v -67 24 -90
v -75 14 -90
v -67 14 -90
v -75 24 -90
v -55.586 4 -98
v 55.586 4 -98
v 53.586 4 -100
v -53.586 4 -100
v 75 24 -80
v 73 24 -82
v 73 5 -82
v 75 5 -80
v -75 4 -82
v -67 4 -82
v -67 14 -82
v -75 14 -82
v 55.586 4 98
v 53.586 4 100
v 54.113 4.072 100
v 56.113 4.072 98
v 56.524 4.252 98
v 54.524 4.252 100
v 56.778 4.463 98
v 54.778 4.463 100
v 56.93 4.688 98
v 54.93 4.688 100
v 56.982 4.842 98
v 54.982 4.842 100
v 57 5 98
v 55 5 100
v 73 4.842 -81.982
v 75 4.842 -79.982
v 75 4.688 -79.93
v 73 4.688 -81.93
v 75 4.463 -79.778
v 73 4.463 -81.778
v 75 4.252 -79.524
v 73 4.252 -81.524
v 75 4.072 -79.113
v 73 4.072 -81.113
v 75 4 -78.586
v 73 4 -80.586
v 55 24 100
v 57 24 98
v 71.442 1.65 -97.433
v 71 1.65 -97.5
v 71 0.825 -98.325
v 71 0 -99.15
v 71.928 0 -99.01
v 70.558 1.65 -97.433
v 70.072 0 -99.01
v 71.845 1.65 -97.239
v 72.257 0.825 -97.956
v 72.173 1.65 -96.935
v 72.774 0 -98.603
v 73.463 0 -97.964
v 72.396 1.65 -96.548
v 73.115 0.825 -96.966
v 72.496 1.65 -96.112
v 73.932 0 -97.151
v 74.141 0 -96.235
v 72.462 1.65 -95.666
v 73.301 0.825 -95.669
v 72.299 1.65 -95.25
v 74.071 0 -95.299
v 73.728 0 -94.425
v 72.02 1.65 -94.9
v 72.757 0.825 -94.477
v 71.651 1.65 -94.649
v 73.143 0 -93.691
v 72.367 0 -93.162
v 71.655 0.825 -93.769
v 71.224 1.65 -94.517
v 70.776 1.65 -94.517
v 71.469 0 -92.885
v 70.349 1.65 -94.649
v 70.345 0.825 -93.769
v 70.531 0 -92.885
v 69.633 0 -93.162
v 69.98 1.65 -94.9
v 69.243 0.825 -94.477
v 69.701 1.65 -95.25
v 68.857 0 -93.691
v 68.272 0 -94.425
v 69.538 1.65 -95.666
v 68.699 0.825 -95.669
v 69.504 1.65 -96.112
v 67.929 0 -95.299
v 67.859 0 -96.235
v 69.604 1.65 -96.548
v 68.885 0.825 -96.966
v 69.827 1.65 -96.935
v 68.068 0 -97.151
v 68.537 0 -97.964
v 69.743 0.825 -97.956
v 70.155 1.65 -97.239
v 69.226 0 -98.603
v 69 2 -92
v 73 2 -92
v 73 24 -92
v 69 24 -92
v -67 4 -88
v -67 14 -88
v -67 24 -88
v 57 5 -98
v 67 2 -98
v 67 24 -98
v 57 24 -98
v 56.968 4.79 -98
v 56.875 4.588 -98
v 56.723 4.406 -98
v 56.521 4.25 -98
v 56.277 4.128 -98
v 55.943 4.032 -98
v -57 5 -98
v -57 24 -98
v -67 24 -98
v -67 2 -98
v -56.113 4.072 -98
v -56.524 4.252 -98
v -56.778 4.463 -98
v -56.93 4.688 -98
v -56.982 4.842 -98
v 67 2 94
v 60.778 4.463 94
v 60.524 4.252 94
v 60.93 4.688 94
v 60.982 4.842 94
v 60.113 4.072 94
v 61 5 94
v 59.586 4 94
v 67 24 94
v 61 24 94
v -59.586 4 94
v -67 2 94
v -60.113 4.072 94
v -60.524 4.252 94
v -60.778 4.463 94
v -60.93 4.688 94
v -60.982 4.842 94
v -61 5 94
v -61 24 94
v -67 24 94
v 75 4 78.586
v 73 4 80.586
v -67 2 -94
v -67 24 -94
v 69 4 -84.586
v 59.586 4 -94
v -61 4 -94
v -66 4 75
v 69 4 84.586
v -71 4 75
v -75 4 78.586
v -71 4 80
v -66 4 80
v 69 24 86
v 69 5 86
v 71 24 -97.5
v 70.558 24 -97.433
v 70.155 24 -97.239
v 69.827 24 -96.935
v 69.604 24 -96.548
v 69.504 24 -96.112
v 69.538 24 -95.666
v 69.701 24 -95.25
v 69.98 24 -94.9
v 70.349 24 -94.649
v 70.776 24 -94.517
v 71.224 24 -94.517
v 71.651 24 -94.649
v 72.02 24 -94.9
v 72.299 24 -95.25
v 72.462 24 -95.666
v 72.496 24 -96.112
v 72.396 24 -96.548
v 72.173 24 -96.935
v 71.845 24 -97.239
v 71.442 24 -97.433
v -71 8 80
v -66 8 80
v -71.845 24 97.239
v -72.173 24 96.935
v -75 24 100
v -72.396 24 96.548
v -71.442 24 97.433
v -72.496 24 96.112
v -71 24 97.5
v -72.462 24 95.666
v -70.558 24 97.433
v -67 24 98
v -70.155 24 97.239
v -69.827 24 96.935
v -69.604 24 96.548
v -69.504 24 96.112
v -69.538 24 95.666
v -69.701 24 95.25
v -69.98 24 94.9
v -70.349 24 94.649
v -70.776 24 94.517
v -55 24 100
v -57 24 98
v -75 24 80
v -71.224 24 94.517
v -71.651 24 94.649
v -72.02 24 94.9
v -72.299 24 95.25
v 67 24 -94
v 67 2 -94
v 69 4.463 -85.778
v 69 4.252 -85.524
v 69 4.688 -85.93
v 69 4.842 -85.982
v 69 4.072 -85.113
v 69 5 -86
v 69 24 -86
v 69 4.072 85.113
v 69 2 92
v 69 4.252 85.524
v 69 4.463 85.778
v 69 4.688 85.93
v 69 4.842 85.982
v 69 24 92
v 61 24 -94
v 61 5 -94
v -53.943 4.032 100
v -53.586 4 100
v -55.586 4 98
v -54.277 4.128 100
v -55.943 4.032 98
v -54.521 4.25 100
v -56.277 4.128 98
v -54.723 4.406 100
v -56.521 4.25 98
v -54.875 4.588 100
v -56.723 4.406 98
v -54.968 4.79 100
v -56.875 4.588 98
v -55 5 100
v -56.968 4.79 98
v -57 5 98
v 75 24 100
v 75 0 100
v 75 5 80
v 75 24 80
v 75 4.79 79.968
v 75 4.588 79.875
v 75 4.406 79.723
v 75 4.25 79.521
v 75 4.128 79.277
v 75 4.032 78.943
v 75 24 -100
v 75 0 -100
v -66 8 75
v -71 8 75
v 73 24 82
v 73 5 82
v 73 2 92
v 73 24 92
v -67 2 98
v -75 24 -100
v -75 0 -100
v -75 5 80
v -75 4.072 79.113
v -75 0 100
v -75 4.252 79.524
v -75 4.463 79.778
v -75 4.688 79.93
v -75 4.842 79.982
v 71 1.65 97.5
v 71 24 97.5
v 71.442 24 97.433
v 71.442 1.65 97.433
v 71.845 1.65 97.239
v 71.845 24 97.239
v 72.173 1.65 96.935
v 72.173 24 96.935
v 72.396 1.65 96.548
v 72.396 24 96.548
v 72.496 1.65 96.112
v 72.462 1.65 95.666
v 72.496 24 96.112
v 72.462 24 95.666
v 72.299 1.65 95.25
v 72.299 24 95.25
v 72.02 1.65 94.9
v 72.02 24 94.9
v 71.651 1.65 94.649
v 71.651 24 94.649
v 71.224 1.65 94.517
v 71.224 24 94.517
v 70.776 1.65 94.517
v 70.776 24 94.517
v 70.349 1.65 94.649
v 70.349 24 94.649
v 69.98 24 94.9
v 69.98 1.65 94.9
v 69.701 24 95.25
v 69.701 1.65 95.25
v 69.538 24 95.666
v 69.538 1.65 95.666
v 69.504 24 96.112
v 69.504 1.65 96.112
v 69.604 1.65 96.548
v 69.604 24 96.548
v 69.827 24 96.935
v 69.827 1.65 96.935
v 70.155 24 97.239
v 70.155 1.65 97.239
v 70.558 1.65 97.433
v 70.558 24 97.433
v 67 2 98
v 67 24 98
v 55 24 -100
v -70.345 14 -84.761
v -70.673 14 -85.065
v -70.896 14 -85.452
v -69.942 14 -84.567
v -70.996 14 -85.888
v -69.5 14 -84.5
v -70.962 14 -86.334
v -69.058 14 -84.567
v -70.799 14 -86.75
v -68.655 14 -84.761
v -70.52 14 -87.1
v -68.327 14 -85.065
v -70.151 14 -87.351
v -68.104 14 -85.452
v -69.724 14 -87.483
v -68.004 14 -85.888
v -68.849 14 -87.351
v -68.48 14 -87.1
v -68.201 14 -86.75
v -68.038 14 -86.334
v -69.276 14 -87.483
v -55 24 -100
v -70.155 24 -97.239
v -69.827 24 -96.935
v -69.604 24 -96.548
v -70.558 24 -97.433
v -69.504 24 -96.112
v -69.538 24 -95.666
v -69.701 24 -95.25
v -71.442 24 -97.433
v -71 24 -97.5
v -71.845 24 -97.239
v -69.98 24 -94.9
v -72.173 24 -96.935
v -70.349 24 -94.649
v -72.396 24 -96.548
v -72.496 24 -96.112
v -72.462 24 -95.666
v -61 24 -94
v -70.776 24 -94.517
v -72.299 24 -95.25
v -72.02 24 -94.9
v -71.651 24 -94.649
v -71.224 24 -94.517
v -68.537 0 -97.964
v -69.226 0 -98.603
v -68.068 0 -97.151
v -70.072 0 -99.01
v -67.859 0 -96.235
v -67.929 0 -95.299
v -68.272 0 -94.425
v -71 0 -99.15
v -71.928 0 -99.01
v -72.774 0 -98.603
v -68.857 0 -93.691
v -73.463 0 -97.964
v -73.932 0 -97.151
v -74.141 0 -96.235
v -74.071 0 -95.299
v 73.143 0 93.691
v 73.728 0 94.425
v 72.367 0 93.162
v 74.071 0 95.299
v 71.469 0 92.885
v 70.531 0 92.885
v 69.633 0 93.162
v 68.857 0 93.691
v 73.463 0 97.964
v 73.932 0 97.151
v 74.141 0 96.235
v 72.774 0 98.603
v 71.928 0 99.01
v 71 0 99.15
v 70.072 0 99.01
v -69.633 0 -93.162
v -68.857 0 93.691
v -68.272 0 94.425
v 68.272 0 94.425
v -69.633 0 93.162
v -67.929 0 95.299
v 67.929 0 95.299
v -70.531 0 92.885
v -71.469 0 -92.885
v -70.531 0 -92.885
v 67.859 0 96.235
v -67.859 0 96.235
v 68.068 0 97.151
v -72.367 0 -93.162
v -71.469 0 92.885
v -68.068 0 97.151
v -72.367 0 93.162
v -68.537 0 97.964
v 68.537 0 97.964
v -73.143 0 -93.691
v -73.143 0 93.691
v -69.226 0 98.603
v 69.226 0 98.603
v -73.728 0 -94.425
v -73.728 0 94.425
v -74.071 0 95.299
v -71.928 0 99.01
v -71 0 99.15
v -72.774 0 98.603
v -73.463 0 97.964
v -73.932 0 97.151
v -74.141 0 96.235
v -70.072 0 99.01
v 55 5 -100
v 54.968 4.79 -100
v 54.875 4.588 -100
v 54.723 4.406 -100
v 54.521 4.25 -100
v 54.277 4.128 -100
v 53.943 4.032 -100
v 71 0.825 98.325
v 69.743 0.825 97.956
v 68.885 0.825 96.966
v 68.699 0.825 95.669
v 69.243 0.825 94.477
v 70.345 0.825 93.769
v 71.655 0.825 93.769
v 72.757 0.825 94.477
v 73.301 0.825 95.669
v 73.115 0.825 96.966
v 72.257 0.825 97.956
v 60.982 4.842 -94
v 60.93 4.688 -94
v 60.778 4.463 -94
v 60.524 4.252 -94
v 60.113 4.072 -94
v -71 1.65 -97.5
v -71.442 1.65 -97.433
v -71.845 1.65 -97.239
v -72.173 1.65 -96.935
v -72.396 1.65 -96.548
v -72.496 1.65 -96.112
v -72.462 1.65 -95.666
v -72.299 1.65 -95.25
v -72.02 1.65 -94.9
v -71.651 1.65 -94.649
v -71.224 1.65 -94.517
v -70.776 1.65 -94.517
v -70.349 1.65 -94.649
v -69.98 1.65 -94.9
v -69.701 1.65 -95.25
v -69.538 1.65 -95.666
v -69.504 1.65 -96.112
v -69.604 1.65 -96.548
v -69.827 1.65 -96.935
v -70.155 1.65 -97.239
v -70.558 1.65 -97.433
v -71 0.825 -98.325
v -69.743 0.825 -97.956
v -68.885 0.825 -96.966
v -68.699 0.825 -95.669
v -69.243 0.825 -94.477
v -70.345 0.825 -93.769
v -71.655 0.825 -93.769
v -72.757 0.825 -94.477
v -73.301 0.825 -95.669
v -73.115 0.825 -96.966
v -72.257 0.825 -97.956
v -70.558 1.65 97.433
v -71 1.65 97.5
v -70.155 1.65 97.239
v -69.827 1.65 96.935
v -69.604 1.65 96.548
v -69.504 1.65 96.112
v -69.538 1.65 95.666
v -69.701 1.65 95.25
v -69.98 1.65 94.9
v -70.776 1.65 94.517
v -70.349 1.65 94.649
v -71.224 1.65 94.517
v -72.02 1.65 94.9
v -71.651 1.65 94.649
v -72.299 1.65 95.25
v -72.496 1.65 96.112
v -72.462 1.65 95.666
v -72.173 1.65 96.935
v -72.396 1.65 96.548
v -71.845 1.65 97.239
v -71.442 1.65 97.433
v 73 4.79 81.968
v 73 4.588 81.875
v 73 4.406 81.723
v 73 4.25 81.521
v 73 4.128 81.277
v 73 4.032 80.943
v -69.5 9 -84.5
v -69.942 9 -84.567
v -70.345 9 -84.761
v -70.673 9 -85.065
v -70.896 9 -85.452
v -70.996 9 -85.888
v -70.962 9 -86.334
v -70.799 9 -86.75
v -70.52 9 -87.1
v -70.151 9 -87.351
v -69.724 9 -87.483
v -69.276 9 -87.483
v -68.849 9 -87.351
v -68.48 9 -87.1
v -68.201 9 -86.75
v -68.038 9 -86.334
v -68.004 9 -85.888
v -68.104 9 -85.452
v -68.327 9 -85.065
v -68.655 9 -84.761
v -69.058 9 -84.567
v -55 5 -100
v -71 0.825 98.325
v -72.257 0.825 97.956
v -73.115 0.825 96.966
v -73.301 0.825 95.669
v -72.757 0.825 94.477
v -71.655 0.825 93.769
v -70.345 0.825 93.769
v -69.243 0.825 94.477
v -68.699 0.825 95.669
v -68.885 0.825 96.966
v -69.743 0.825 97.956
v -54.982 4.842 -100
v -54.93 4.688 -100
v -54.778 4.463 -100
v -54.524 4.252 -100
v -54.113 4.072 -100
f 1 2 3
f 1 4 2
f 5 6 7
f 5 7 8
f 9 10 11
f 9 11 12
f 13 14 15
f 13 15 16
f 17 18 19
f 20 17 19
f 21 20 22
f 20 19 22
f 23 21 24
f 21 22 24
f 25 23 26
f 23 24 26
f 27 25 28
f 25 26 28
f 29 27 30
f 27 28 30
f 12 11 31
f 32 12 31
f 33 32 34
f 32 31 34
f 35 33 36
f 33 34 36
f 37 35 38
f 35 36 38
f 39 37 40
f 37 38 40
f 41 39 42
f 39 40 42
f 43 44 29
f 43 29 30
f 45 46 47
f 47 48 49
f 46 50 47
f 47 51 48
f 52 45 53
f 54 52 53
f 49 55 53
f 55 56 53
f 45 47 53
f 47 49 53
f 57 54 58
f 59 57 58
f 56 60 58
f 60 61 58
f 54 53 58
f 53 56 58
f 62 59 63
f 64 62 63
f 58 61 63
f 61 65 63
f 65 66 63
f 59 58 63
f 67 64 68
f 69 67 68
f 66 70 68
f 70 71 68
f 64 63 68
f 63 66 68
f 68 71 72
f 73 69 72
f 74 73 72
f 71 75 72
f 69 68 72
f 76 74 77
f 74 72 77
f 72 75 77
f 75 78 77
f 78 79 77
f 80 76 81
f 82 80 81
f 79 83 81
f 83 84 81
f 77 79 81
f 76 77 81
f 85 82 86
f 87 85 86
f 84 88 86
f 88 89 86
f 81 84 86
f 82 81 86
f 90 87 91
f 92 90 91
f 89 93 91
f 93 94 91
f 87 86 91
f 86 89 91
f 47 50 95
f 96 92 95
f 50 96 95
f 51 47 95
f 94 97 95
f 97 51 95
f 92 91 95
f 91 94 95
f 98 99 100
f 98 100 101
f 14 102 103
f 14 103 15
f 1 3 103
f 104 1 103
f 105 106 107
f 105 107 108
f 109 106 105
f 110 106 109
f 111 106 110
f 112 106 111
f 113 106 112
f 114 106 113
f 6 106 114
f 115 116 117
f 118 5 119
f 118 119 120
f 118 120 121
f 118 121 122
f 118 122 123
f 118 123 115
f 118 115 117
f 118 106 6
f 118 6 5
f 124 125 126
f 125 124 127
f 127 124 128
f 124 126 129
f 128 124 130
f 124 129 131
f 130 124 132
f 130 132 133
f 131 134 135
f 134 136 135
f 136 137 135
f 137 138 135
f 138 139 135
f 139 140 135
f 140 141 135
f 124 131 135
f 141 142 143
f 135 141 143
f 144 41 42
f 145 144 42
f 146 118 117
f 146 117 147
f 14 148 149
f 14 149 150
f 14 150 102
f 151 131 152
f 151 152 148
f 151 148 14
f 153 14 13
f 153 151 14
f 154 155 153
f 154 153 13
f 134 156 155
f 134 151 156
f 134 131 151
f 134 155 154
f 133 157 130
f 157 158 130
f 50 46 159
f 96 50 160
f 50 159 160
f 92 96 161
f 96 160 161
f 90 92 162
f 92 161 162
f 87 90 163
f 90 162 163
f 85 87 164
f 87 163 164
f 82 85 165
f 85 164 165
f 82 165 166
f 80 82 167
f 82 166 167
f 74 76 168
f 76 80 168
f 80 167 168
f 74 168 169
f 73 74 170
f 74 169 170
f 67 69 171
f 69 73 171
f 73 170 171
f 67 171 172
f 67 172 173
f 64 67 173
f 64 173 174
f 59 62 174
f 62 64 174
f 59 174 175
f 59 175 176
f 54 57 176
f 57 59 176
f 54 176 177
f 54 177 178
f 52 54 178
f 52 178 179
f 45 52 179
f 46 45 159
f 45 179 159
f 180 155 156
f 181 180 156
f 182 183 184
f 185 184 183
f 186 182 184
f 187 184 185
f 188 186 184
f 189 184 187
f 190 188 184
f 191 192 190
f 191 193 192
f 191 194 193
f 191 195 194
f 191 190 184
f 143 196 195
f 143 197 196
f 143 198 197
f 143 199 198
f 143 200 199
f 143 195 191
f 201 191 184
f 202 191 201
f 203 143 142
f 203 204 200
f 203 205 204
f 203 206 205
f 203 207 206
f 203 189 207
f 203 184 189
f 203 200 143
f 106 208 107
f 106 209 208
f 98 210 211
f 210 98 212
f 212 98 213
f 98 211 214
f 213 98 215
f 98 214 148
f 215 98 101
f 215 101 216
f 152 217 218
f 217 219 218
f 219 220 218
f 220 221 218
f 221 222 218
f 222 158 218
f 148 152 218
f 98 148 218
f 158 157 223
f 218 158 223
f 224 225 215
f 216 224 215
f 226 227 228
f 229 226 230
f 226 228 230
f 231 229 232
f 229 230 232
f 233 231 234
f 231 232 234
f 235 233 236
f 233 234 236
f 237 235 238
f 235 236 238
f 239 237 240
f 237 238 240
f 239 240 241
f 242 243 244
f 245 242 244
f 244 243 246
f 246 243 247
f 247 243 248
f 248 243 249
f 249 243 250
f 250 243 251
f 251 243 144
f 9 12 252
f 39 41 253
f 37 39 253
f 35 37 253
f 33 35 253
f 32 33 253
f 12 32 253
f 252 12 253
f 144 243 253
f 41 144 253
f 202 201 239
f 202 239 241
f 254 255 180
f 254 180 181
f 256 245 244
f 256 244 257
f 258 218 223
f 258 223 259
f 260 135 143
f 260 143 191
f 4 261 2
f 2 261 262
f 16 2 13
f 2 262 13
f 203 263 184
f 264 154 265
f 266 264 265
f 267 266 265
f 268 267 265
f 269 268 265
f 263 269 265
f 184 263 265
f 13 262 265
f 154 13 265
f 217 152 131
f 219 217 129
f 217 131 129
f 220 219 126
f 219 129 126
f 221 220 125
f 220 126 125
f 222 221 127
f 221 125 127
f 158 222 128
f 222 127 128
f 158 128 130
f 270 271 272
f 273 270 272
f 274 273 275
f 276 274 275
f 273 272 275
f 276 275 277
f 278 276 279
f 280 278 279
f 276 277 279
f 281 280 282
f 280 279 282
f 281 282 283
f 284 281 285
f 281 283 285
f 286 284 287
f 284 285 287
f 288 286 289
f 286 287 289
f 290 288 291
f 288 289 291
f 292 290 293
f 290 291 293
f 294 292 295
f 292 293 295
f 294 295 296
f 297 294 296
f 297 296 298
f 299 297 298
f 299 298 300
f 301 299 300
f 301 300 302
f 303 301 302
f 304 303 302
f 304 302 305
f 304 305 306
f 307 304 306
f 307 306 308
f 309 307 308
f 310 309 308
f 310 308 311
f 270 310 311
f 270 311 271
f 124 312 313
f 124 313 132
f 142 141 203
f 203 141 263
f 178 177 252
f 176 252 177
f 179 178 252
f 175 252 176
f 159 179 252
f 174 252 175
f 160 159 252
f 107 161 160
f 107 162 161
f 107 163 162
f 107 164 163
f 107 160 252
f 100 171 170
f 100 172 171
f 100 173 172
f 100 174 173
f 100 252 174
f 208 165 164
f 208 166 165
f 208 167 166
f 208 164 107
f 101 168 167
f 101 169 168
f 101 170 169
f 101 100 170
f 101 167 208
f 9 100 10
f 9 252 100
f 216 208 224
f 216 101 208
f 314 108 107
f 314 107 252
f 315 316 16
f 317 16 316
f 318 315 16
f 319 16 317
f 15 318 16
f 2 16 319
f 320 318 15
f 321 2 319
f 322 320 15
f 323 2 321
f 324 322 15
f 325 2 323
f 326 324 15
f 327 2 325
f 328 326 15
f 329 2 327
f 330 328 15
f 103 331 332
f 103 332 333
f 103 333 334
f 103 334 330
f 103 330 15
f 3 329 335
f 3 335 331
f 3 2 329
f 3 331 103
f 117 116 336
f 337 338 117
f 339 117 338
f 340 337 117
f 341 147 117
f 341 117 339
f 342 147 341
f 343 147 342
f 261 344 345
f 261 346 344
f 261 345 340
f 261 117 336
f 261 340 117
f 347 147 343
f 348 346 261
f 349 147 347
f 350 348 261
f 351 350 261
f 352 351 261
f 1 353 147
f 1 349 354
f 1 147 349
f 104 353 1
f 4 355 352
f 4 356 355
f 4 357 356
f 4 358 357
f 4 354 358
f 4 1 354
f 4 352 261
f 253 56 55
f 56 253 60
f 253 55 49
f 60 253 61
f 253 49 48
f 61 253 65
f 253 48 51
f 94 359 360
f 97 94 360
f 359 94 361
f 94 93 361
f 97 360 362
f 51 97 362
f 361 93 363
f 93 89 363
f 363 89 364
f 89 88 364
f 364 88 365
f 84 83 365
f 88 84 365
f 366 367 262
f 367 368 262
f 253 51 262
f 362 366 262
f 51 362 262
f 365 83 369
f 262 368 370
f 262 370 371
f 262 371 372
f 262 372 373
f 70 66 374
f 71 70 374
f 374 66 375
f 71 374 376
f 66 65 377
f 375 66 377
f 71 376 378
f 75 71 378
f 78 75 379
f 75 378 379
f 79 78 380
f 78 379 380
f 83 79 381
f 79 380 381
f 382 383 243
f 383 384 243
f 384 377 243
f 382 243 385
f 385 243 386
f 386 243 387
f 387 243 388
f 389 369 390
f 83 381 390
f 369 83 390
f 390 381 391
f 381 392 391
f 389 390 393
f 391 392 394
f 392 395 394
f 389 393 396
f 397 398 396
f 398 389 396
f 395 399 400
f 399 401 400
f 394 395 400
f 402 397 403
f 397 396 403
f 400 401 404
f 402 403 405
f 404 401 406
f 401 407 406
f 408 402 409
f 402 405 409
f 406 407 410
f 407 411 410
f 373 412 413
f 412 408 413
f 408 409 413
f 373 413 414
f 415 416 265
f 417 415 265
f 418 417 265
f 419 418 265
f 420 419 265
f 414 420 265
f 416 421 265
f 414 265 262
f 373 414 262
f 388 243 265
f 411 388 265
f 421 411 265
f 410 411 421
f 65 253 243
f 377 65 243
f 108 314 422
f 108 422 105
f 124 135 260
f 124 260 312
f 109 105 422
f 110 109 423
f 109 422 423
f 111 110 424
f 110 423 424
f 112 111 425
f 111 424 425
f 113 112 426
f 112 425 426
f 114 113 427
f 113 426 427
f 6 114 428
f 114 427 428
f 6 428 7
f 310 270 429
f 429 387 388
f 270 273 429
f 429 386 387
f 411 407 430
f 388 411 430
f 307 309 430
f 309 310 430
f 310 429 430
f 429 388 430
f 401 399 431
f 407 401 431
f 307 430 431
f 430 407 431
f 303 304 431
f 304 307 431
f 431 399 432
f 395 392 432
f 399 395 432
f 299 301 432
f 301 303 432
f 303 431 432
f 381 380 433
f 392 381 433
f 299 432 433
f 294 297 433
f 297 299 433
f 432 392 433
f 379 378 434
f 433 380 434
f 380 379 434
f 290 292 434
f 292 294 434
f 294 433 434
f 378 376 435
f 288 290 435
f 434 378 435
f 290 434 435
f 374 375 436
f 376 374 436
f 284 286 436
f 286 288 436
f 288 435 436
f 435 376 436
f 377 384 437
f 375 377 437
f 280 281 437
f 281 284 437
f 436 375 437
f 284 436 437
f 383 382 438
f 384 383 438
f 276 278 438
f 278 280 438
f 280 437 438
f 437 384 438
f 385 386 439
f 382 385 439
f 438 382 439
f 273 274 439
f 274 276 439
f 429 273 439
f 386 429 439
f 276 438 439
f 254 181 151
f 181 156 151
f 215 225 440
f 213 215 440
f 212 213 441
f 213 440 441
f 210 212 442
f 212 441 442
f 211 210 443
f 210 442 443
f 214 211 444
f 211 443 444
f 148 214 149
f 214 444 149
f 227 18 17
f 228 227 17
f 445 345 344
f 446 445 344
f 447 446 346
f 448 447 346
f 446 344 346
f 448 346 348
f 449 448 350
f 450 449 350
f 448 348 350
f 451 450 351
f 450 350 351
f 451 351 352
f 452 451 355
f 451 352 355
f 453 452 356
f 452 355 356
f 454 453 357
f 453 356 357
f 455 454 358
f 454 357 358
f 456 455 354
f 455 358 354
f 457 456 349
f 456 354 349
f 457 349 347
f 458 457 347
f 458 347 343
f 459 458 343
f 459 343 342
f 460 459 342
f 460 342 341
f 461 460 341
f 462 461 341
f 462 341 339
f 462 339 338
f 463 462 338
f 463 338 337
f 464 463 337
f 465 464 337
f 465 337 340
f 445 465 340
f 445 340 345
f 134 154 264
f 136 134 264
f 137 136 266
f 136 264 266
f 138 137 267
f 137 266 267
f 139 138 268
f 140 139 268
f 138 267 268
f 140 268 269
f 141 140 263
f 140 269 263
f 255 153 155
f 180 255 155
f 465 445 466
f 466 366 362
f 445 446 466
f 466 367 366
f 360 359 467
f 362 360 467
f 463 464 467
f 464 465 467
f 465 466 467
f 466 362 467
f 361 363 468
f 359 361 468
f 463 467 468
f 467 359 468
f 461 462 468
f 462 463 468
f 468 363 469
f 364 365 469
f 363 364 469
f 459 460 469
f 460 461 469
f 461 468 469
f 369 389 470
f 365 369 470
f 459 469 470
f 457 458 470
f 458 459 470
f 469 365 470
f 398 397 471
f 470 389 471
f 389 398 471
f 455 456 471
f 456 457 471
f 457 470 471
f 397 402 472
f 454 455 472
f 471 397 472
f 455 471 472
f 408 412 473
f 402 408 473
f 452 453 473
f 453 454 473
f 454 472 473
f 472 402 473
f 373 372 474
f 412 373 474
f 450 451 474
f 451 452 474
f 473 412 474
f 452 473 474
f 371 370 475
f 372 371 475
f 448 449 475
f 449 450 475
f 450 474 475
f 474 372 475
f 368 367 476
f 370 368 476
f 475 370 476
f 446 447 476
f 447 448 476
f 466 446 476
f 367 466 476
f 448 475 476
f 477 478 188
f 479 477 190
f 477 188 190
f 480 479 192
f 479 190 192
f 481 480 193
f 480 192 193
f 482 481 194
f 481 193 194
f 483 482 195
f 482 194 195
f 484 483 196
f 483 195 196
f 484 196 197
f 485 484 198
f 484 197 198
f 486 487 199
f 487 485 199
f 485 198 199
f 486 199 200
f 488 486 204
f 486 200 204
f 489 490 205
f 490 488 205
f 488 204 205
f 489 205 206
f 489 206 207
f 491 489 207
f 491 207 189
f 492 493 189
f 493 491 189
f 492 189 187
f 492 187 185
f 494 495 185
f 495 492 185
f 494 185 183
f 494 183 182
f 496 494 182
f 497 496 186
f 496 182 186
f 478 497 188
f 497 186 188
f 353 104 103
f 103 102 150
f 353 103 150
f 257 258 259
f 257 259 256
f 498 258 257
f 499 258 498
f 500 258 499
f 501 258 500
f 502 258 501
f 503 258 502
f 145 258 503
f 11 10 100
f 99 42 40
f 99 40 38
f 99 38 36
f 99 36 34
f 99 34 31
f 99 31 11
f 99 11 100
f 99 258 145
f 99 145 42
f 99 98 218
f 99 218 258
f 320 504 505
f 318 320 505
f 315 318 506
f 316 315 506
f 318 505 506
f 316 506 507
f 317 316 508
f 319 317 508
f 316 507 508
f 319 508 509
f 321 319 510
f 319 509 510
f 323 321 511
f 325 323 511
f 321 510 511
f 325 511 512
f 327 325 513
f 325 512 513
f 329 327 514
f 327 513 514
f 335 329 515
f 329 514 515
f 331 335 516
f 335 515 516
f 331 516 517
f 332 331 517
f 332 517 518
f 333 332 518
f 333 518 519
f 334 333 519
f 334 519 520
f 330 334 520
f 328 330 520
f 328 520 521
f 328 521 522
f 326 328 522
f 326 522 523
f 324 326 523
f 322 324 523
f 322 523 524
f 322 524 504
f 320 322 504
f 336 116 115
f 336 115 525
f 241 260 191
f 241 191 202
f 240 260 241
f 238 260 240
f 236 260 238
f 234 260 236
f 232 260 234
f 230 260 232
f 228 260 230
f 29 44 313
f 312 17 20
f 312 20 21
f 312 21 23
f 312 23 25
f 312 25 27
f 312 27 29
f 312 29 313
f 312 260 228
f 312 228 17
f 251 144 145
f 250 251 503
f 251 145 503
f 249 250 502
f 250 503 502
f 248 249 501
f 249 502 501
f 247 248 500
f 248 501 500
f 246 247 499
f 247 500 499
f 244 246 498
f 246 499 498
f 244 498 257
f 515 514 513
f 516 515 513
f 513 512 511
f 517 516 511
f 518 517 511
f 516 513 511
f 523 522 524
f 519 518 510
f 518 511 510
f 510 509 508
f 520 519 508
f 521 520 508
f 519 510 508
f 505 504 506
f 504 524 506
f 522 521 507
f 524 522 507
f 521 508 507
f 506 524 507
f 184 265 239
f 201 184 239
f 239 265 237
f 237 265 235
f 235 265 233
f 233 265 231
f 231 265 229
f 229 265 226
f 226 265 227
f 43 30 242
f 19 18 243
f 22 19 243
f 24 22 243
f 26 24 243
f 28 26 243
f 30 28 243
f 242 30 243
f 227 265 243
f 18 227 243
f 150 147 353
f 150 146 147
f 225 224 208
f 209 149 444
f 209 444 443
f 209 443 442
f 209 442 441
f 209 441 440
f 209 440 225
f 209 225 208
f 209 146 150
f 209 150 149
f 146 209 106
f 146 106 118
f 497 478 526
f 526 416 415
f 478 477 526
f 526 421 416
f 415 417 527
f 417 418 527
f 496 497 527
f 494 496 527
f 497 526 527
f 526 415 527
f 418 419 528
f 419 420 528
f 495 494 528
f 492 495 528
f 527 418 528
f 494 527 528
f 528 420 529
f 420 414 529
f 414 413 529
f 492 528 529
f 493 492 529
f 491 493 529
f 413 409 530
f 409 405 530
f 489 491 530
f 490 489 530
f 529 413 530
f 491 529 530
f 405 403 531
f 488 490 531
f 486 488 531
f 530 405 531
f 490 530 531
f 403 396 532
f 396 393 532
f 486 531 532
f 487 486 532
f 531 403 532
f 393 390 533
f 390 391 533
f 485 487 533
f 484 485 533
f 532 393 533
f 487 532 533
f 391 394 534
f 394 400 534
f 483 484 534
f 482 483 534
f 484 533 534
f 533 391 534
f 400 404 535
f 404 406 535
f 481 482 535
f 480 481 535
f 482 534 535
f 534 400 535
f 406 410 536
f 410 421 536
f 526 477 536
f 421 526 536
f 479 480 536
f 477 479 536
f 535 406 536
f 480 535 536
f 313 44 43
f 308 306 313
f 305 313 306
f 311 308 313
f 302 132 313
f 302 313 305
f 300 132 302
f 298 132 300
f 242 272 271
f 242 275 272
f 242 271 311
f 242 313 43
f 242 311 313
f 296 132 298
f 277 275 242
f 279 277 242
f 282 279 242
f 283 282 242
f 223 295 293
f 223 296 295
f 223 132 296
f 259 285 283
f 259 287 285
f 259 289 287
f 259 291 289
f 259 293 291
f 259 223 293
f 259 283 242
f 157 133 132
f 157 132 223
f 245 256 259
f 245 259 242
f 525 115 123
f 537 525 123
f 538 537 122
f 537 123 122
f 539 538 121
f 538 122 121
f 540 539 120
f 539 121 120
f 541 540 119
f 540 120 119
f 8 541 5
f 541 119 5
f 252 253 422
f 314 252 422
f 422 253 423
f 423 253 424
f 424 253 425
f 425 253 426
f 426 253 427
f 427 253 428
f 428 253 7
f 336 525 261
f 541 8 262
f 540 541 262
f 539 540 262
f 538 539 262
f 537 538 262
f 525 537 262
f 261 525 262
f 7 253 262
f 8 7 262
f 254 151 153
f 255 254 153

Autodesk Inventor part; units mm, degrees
ref_plane "YZ Plane" through (0, 0, 0) normal (1, 0, 0) x (0, 1, 0)
sketch "Náčrt1" plane through (0, 0, 0) normal (0, 1, 0) x (-1, 0, 0)
  line L0 (75, 100) -> (-75, 100)
  line L1 (-75, 100) -> (-75, -100)
  line L2 (-75, -100) -> (75, -100)
  line L3 (75, -100) -> (75, 100)
  line L4 (105, 0) -> (-105, 0) projected
  line L5 (0, -140) -> (0, 140) projected
  point P0 (0, 0)
  dimension "d0" = 200
  dimension "d1" = 150
extrude "Vysunutí1" add sketch "Náčrt1" along normal blind 4
sketch "Náčrt2" plane through (0, 4, 0) normal (0, 1, 0) x (1, 0, 0)
  line L0 (-75, -100) -> (-75, -80)
  line L1 (-75, -100) -> (-55, -100)
  line L2 (-75, 100) -> (-75, -100) projected
  line L3 (-75, -100) -> (75, -100) projected
  line L4 (-67, -98) -> (-57, -98)
  line L5 (-61, -94) -> (-67, -94)
  line L6 (-67, -94) -> (-67, -98)
  line L7 (-55, -100) -> (-57, -98)
  line L8 (-61, -94) -> (-75, -80)
  line L9 (55, -100) -> (75, -100)
  line L10 (75, -100) -> (75, -80)
  line L11 (75, -100) -> (75, 100) projected
  line L12 (57, -98) -> (67, -98)
  line L13 (67, -98) -> (67, -94)
  line L14 (67, -94) -> (61, -94)
  line L15 (57, -98) -> (55, -100)
  line L16 (69, -92) -> (73, -92)
  line L17 (73, -92) -> (73, -82)
  line L18 (69, -86) -> (69, -92)
  line L19 (75, -80) -> (73, -82)
  line L20 (69, -86) -> (61, -94)
  point P0 (0, 0)
  point P1 (55, -100)
  dimension "d4" = 20
  dimension "d17" = 4
  dimension "d18" = 2
  dimension "d19" = 8
  dimension "d20" = 10
  dimension "d21" = 6
  dimension "d66" = 20
  dimension "d67" = 20
  dimension "d70" = 2
  dimension "d71" = 10
  dimension "d72" = 8
  dimension "d74" = 4
  dimension "d75" = 6
  dimension "d77" = 10
  dimension "d78" = 2
  dimension "d79" = 8
  dimension "d80" = 4
  dimension "d81" = 6
extrude "Vysunutí7" add sketch "Náčrt2" along normal blind 20
mirror "Zrcadlit5" about plane through (0, 0, 0) normal (0, 0, 1) of "Vysunutí7"
ref_plane "Pracovní rovina2" through (0, 14, 0) normal (0, 1, 0) x (1, 0, 0)
sketch "Náčrt11" plane through (0, 0, 0) normal (0, -1, 0) x (1, 0, 0)
  line L0 (75, -100) -> (-75, -100) projected
  line L1 (-75, -100) -> (-75, 100) projected
  point P0 (0, 0)
  point P1 (-71, -96)
  dimension "d100" = 4
  dimension "d101" = 4
hole "Díra4" at (-71, 0, -96) direction (0, 1, 0) diameter 3 end through all countersink diameter 6.3 countersink angle 90 clearance for "Šroub se zápustnou hlavou ISO 2009/7046" size "M3" standard "ISO"
pattern_circular "Kruhové pole1" count 2 over 360 about axis through (0, -10, 0) along (0, 1, 0) of "Díra4"
mirror "Zrcadlit6" about plane through (0, 0, 0) normal (0, 0, 1) of "Kruhové pole1", "Díra4"
sketch "Náčrt12" plane through (0, 4, 0) normal (0, 1, 0) x (1, 0, 0)
  line L0 (-67, -98) -> (67, -98)
  line L1 (67, -98) -> (67, -94)
  line L2 (67, -94) -> (-67, -94)
  line L3 (-67, -94) -> (-67, -98)
  line L4 (-67, -98) -> (-67, -94) projected
  line L5 (67, -94) -> (67, -98) projected
  line L6 (61, -94) -> (67, -94) projected
  line L7 (67, -98) -> (57, -98) projected
  point P0 (0, 0)
extrude "Vysunutí9" cut sketch "Náčrt12" against normal blind 2
mirror "Zrcadlit7" about plane through (0, 0, 0) normal (0, 0, 1) of "Vysunutí9"
sketch "Náčrt13" plane through (0, 4, 0) normal (0, 1, 0) x (1, 0, 0)
  line L0 (69, -92) -> (73, -92)
  line L1 (73, -92) -> (73, 92)
  line L2 (73, 92) -> (69, 92)
  line L3 (69, 92) -> (69, -92)
  line L4 (73, -92) -> (69, -92) projected
  line L5 (73, 92) -> (69, 92) projected
  line L6 (73, 82) -> (73, 92) projected
  line L7 (69, 92) -> (69, 86) projected
  point P0 (0, 0)
extrude "Vysunutí10" cut sketch "Náčrt13" against normal blind 2
sketch "Náčrt14" plane through (0, 4, 0) normal (0, 1, 0) x (1, 0, 0)
  line L0 (-71, -80) -> (-66, -80)
  line L1 (-66, -80) -> (-66, -75)
  line L2 (-66, -75) -> (-71, -75)
  line L3 (-71, -75) -> (-71, -80)
  line L4 (-75, 80) -> (-75, -80) projected
  line L5 (-75, -100) -> (-55, -100) projected
  point P0 (0, 0)
  dimension "d116" = 5
  dimension "d117" = 5
  dimension "d118" = 4
  dimension "d119" = 20
extrude "Vysunutí11" add sketch "Náčrt14" along normal blind 4
fillet "Zaoblení1" radius 1 9 edges at (-56, 4, -99) (56, 4, -99) (65, 4, -90) (74, 4, -81) (-56, 4, 99) (-68, 4, 87) (65, 4, 90) (74, 4, 81) (56, 4, 99)
sketch "Náčrt15" plane through (-75, 24, -100) normal (0, 1, 0) x (1, 0, 0)
  line L0 (0, -10) -> (8, -10)
  line L1 (8, -10) -> (8, -20)
  line L2 (8, -20) -> (0, -20)
  line L3 (0, -20) -> (0, -10)
  line L4 (0, -20) -> (0, 0) projected
  point P0 (75, -100)
  dimension "d123" = 8
  dimension "d124" = 10
extrude "Vysunutí12" cut sketch "Náčrt15" against normal up to surface (20 mm away)
sketch "Náčrt16" plane through (0, 4, 0) normal (0, 1, 0) x (1, 0, 0)
  line L0 (-75, 90) -> (-75, -78.5858) projected
  line L1 (-75, 90) -> (-67, 90)
  line L2 (-67, 90) -> (-67, 82)
  line L3 (-67, 82) -> (-75, 82)
  line L4 (-75, 82) -> (-75, 90)
  line L5 (-75, 90) -> (-67, 90) projected
  line L6 (-67, 90) -> (-67, 88) projected
  point P0 (0, 0)
  dimension "d142" = 8
ref_plane "Pracovní rovina3" through (0, 14, 0) normal (0, 1, 0) x (1, 0, 0)
extrude "Vysunutí14" add sketch "Náčrt16" along normal blind 10
sketch "Náčrt18" plane through (0, 14, 0) normal (0, 1, 0) x (1, 0, 0)
  line L0 (-67, 82) -> (-67, 88) projected
  line L1 (-75, 82) -> (-67, 82) projected
  point P0 (0, 0)
  point P1 (-69.5, 86)
  dimension "d145" = 2.5
  dimension "d146" = 4
hole "Díra6" at (-69.5, 14, -86) direction (0, -1, 0) diameter 3 depth 5
properties part number "Cabinet"
